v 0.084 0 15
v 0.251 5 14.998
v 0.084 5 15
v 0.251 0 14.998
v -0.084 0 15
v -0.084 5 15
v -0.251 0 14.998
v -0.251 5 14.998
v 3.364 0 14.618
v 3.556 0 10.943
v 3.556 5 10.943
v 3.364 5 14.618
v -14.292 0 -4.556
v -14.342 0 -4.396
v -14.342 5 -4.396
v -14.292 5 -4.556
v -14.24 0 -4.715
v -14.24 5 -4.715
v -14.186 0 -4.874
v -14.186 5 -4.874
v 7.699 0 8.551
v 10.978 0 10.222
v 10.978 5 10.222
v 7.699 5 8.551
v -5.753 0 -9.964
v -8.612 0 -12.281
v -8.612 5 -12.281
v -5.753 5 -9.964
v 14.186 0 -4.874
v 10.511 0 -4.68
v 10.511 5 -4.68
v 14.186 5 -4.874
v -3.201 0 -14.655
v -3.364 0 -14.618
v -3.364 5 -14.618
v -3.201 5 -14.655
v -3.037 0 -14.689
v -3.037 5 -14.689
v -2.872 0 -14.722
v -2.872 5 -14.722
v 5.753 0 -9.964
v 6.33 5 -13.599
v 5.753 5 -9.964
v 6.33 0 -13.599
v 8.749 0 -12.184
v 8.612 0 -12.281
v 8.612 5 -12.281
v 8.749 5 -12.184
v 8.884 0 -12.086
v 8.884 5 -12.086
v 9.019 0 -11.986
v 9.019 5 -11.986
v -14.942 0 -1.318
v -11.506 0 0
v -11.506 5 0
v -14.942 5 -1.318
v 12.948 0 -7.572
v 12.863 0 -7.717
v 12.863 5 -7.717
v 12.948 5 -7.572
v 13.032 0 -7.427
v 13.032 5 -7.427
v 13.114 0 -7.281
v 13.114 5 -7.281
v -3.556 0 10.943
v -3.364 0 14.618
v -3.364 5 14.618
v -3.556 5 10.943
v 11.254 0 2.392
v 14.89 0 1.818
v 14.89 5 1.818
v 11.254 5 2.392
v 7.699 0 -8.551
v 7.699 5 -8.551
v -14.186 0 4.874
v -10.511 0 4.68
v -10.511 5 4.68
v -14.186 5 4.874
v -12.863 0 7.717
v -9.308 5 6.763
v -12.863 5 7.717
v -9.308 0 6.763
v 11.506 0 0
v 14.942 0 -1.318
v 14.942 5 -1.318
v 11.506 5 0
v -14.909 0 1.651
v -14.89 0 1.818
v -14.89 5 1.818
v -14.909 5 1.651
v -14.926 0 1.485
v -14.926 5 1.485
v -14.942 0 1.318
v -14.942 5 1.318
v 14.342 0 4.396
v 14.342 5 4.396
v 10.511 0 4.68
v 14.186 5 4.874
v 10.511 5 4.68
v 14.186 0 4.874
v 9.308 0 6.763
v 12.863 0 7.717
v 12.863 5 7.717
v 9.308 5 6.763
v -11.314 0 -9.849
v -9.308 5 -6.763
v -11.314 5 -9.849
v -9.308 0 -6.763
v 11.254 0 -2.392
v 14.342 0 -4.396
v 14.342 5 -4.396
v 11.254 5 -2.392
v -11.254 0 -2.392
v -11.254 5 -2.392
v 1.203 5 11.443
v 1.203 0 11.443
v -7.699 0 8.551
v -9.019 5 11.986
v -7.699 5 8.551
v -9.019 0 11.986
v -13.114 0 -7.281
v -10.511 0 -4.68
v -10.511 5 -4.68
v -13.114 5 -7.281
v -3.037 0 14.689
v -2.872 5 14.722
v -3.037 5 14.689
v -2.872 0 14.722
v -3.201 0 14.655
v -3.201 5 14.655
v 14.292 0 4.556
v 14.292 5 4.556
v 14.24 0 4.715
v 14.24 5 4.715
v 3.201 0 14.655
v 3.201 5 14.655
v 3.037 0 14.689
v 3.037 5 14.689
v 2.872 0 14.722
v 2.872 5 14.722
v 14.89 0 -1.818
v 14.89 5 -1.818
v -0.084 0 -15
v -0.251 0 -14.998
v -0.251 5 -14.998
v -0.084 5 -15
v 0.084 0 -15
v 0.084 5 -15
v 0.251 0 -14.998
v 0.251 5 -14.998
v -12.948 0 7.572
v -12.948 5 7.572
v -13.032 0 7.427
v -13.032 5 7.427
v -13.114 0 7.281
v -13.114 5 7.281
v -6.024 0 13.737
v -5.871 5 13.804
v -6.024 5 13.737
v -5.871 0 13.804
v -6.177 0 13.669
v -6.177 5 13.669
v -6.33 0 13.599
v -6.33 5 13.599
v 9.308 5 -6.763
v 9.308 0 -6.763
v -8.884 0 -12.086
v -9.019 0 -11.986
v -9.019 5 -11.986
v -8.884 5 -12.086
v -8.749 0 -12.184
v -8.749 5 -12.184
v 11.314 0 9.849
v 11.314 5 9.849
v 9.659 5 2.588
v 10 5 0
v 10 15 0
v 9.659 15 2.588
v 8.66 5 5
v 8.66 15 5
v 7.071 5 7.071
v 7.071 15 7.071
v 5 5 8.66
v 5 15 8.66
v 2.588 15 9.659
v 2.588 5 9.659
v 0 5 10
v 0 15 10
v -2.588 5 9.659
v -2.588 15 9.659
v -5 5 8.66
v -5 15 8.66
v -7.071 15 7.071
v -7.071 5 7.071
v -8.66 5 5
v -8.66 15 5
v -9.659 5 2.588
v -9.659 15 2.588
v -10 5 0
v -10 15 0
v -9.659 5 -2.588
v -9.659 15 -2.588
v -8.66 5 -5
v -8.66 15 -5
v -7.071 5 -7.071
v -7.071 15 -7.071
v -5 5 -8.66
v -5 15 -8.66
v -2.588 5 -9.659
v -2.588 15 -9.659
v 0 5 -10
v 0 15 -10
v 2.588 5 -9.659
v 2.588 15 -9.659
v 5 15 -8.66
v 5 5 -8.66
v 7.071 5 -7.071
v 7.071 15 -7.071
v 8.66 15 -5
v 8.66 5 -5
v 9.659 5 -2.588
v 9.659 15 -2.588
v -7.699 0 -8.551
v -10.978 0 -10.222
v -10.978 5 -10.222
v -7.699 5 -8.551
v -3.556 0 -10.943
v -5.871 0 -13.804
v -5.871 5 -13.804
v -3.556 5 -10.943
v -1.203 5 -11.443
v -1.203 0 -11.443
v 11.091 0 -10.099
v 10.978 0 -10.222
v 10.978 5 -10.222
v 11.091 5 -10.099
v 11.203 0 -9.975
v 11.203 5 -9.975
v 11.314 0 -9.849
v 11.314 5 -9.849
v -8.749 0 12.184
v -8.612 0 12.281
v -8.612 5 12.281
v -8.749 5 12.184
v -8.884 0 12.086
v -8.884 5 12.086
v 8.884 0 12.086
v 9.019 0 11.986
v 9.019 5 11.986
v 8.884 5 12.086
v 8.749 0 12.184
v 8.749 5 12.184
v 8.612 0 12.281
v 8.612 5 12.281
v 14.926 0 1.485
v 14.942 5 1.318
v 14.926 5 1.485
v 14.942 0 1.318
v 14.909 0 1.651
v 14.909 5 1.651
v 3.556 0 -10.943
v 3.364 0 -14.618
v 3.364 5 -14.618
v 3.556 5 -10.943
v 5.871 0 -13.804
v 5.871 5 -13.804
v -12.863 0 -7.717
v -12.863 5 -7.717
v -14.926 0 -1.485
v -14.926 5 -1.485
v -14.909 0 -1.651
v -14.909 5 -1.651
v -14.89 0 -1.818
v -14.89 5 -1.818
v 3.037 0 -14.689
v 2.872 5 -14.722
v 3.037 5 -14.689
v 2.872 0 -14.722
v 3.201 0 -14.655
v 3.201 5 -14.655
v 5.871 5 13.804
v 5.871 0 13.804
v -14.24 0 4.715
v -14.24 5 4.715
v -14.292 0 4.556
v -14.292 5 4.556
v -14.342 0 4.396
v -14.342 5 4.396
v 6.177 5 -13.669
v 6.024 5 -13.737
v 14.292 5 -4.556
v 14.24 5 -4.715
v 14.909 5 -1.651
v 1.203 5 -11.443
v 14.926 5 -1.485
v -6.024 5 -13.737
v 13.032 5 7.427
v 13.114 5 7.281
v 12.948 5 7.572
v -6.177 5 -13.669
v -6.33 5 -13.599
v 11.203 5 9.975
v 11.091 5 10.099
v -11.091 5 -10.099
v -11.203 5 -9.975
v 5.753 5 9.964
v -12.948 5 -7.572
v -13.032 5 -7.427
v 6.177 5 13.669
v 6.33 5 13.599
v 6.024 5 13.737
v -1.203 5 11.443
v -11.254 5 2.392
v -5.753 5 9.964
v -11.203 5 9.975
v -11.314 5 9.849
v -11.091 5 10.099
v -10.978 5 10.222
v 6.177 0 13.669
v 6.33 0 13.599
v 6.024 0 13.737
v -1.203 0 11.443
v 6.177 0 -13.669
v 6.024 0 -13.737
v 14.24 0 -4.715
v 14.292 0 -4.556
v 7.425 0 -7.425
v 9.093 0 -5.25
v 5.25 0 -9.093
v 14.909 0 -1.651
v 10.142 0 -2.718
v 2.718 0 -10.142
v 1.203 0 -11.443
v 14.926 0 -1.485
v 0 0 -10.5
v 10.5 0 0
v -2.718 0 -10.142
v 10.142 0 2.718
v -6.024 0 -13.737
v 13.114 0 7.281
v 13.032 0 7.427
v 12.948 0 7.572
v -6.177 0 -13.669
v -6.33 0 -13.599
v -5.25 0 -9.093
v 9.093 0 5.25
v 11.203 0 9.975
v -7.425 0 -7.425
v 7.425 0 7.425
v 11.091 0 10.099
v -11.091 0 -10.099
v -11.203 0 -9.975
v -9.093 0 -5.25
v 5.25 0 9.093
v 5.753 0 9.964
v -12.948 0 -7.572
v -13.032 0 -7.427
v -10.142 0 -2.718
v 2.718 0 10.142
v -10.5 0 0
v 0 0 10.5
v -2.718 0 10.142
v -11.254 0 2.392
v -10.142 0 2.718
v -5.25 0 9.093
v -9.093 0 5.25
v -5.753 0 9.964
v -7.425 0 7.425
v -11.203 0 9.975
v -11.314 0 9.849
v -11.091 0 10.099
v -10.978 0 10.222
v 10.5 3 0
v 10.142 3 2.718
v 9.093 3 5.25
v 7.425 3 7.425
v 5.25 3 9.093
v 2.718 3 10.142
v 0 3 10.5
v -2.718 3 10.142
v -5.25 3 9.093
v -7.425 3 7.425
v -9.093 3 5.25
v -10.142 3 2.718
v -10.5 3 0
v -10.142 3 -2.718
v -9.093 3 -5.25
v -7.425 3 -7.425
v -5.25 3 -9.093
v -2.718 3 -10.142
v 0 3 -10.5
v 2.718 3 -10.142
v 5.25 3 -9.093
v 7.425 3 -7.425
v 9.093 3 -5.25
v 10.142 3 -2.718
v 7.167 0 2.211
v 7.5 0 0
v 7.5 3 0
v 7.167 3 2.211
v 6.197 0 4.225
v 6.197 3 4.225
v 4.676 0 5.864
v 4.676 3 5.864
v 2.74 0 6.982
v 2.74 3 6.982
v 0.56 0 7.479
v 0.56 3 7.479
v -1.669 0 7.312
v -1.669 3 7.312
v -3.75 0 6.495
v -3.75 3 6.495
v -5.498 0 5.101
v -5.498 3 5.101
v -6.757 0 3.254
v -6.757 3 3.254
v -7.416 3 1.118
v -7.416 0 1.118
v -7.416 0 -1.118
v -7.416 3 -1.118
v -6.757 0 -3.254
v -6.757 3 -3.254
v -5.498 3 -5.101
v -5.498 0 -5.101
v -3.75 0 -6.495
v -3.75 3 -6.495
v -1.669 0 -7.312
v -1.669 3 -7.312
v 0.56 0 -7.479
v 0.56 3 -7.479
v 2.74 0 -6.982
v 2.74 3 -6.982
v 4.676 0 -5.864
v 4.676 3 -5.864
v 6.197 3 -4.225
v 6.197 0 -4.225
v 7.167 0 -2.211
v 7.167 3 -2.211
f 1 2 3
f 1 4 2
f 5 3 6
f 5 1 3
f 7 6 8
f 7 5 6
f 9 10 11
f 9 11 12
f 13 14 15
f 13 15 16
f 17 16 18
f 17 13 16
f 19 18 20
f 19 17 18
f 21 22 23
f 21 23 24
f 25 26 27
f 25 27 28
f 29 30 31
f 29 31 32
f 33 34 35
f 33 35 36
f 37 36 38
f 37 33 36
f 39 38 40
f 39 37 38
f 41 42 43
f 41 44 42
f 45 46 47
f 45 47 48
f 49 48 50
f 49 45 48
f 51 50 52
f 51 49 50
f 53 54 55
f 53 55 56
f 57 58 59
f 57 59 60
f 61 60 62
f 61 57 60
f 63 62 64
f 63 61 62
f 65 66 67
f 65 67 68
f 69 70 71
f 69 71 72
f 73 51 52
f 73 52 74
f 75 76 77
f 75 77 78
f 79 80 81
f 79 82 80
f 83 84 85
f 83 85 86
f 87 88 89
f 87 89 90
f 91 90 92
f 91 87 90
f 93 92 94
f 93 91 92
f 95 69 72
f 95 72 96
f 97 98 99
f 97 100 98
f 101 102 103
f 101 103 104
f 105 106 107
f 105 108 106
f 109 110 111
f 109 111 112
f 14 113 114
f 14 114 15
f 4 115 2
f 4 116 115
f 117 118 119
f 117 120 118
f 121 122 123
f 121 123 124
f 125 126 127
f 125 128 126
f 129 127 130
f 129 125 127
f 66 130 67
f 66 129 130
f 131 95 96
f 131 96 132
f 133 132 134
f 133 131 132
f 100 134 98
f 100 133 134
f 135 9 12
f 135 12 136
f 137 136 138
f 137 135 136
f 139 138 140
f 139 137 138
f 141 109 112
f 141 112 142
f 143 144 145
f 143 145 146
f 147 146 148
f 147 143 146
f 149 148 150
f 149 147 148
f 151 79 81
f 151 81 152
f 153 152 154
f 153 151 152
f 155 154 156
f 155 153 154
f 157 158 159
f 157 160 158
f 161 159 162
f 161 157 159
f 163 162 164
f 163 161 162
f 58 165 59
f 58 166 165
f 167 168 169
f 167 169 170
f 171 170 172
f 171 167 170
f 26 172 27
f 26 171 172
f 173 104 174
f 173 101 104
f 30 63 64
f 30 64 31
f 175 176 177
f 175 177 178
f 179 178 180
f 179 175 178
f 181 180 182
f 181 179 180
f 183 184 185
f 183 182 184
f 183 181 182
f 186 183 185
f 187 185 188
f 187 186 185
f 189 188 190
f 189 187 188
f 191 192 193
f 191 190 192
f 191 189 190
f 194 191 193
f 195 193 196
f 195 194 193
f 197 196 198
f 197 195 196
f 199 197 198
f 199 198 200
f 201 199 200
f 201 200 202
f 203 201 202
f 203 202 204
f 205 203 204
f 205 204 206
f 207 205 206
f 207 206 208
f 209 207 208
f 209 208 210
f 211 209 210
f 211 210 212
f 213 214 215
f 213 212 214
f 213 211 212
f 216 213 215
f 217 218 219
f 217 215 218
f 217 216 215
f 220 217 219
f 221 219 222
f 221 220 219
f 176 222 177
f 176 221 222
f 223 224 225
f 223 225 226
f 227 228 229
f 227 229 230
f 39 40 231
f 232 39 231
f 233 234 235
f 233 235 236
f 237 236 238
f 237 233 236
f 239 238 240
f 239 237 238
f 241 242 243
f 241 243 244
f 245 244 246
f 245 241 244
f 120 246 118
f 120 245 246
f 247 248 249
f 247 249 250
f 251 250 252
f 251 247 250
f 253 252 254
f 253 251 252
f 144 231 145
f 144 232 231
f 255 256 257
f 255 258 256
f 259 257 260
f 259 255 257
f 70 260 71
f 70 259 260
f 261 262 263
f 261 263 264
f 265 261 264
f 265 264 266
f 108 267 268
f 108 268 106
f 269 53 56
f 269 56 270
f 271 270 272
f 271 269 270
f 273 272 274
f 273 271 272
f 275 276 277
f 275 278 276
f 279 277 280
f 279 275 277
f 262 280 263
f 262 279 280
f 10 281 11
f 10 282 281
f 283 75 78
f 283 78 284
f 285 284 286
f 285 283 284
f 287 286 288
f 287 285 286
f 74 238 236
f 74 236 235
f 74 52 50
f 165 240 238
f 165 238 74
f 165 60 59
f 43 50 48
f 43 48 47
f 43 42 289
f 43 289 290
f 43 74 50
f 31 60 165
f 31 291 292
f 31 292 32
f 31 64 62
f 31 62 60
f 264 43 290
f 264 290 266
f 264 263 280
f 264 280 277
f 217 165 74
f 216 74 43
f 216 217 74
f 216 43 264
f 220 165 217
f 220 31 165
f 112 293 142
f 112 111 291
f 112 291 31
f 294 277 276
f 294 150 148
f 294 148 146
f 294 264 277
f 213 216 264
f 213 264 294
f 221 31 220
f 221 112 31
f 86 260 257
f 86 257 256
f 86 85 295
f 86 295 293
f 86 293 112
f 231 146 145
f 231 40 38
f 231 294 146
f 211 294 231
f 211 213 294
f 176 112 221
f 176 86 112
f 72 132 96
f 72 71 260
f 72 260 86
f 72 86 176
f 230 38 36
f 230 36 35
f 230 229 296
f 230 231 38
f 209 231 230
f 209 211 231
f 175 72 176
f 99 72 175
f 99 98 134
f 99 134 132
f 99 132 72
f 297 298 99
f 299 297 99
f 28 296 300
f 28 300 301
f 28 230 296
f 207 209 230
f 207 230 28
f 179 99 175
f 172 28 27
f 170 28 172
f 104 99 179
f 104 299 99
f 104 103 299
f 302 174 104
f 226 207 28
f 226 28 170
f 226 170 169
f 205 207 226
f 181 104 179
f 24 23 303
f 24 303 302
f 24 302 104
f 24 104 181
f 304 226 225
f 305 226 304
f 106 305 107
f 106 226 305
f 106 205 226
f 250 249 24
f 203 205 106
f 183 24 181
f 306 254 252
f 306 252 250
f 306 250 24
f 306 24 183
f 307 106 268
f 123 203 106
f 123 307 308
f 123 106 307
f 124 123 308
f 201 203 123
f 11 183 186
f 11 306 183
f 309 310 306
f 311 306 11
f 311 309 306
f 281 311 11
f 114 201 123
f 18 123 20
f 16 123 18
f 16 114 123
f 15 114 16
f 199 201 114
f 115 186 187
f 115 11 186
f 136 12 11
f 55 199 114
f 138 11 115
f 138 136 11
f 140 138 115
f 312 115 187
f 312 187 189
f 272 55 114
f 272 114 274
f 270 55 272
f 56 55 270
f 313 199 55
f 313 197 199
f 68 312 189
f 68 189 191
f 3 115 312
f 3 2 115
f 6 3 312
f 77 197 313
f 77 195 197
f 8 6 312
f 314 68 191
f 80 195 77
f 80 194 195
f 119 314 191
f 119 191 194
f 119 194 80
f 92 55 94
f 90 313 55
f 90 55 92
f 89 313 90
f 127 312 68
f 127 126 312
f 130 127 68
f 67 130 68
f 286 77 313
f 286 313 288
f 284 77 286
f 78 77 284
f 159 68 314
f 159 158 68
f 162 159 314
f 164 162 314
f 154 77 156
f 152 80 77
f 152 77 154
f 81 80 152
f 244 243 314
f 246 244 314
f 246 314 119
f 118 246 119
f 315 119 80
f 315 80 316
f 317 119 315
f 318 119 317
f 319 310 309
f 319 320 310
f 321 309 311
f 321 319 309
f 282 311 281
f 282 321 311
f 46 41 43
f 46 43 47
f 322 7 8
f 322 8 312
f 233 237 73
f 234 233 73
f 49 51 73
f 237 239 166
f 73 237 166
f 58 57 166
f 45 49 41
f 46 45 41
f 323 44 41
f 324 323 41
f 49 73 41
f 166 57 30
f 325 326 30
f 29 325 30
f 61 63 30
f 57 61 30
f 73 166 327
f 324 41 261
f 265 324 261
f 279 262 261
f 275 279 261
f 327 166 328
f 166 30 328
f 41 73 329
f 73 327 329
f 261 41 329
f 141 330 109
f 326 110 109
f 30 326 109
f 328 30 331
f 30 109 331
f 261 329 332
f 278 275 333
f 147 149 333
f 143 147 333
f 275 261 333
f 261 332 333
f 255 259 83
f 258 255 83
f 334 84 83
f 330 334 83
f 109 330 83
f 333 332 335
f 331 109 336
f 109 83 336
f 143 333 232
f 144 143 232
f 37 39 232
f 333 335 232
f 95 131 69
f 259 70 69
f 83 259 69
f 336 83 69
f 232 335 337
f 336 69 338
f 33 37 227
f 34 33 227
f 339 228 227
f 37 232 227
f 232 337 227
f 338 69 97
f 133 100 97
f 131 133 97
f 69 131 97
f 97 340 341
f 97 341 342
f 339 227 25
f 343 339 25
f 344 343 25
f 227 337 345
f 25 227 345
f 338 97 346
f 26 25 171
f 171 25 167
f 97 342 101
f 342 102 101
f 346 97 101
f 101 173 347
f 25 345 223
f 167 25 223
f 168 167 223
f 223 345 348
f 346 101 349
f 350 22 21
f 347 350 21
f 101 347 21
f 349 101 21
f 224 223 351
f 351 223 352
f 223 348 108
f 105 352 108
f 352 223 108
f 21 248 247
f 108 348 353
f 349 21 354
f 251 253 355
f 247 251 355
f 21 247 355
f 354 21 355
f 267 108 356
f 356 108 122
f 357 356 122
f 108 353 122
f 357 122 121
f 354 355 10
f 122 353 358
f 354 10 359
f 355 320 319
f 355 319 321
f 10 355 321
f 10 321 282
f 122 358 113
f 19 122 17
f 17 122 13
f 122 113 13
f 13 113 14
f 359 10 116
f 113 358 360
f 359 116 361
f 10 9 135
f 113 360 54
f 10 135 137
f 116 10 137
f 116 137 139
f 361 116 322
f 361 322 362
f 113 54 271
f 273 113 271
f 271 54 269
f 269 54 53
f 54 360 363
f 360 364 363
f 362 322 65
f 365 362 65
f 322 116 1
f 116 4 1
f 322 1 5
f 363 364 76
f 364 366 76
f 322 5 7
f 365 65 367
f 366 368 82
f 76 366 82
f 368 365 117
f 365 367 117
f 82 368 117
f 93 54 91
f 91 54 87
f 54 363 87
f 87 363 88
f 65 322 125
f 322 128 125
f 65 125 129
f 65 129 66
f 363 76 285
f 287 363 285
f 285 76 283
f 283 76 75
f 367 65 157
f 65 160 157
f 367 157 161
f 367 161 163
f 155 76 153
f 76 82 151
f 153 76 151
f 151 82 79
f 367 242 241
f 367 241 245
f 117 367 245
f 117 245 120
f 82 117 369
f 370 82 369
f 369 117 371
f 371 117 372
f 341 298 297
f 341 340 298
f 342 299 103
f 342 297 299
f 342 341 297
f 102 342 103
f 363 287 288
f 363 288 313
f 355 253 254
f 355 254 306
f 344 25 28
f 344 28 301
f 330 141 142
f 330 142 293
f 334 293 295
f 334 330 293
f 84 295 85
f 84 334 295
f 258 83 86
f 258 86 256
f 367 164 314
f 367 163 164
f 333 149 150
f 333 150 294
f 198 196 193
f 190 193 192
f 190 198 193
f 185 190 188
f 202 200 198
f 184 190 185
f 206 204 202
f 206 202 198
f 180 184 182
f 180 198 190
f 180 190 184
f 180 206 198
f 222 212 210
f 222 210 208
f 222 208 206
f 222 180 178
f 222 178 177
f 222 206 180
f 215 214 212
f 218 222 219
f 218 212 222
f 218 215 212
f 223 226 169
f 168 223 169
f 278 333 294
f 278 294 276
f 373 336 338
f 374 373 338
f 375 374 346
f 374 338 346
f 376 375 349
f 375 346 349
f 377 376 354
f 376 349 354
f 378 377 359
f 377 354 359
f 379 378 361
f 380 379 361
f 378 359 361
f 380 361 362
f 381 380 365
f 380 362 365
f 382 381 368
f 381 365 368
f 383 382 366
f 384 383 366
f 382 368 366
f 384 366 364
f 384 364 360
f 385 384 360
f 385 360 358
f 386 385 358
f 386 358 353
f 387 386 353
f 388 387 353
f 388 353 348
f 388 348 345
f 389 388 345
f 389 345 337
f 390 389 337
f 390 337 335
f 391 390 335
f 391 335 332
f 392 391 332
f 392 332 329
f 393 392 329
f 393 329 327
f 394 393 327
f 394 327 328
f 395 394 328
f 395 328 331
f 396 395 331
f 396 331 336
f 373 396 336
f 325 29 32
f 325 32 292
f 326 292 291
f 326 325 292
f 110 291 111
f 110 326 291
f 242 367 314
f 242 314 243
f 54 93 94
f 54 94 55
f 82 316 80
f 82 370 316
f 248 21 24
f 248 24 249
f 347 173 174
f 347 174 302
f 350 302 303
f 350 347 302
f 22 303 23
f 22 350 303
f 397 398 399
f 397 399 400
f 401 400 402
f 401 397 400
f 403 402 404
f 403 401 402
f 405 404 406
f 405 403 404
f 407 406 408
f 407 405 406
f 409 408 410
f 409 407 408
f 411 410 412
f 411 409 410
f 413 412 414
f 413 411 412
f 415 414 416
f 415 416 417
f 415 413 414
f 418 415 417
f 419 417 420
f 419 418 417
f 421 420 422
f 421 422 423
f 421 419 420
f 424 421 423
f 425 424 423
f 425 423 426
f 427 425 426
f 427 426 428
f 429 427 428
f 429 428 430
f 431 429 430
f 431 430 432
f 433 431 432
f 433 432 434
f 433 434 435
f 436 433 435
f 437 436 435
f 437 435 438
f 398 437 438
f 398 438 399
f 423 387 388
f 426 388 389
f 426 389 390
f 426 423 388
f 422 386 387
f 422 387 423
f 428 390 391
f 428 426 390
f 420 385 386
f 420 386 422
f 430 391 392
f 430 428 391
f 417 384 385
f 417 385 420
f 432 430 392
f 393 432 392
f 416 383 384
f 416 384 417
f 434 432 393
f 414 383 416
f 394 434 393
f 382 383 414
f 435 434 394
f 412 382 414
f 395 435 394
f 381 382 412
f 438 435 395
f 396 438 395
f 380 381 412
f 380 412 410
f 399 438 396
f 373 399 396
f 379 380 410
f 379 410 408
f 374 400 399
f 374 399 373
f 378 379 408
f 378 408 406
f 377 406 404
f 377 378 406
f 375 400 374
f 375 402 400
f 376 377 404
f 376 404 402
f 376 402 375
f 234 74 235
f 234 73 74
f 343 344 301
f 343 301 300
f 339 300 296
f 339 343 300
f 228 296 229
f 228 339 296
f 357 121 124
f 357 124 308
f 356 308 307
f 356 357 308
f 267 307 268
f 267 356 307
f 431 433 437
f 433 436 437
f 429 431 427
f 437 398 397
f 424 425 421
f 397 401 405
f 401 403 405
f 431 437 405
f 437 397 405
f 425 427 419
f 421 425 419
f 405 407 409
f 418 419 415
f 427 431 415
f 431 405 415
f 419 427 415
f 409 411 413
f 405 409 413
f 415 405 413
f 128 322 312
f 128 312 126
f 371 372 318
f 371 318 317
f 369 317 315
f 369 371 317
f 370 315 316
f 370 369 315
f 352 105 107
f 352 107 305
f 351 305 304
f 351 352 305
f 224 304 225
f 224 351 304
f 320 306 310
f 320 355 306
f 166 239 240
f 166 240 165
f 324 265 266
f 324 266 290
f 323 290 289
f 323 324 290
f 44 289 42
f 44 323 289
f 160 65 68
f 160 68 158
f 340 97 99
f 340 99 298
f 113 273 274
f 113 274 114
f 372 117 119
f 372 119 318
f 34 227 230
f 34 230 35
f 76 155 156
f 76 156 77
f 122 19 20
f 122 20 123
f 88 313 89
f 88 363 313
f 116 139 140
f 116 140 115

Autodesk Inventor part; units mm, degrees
ref_plane "YZ Plane" through (0, 0, 0) normal (1, 0, 0) x (0, 1, 0)
ref_plane "XZ Plane" through (0, 0, 0) normal (0, 1, 0) x (-1, 0, 0)
ref_plane "XY Plane" through (0, 0, 0) normal (0, 0, 1) x (1, 0, 0)
sketch "Sketch1" plane through (0, 0, 0) normal (0, 1, 0) x (-1, 0, 0)
  circle A0 centre (0, 0) radius 15
  line L0 (14.942, 1.3178) -> (11.506, 0)
  line L1 (11.506, 0) -> (14.942, -1.3178)
  line L2 (14.3415, 4.3956) -> (11.2545, 2.3922)
  line L3 (11.2545, 2.3922) -> (14.8895, 1.8176)
  line L4 (13.1142, 7.2813) -> (10.5112, 4.6799)
  line L5 (10.5112, 4.6799) -> (14.1862, 4.8736)
  line L6 (11.3137, 9.8488) -> (9.3085, 6.763)
  line L7 (9.3085, 6.763) -> (12.8629, 7.7166)
  line L8 (9.0188, 11.9859) -> (7.699, 8.5506)
  line L9 (7.699, 8.5506) -> (10.9775, 10.2223)
  line L10 (6.3297, 13.5991) -> (5.753, 9.9645)
  line L11 (5.753, 9.9645) -> (8.6123, 12.2812)
  line L12 (3.364, 14.6179) -> (3.5555, 10.9428)
  line L13 (3.5555, 10.9428) -> (5.8706, 13.8035)
  line L14 (0.2513, 14.9979) -> (1.2027, 11.4429)
  line L15 (1.2027, 11.4429) -> (2.8725, 14.7224)
  line L16 (-2.8725, 14.7224) -> (-1.2027, 11.4429)
  line L17 (-1.2027, 11.4429) -> (-0.2513, 14.9979)
  line L18 (-5.8706, 13.8035) -> (-3.5555, 10.9428)
  line L19 (-3.5555, 10.9428) -> (-3.364, 14.6179)
  line L20 (-8.6123, 12.2812) -> (-5.753, 9.9645)
  line L21 (-5.753, 9.9645) -> (-6.3297, 13.5991)
  line L22 (-10.9775, 10.2223) -> (-7.699, 8.5506)
  line L23 (-7.699, 8.5506) -> (-9.0188, 11.9859)
  line L24 (-12.8629, 7.7166) -> (-9.3085, 6.763)
  line L25 (-9.3085, 6.763) -> (-11.3137, 9.8488)
  line L26 (-14.1862, 4.8736) -> (-10.5112, 4.6799)
  line L27 (-10.5112, 4.6799) -> (-13.1142, 7.2813)
  line L28 (-14.8895, 1.8176) -> (-11.2545, 2.3922)
  line L29 (-11.2545, 2.3922) -> (-14.3415, 4.3956)
  line L30 (-14.942, -1.3178) -> (-11.506, 0)
  line L31 (-11.506, 0) -> (-14.942, 1.3178)
  line L32 (-14.3415, -4.3956) -> (-11.2545, -2.3922)
  line L33 (-11.2545, -2.3922) -> (-14.8895, -1.8176)
  line L34 (-13.1142, -7.2813) -> (-10.5112, -4.6799)
  line L35 (-10.5112, -4.6799) -> (-14.1862, -4.8736)
  line L36 (-11.3137, -9.8488) -> (-9.3085, -6.763)
  line L37 (-9.3085, -6.763) -> (-12.8629, -7.7166)
  line L38 (-9.0188, -11.9859) -> (-7.699, -8.5506)
  line L39 (-7.699, -8.5506) -> (-10.9775, -10.2223)
  line L40 (-6.3297, -13.5991) -> (-5.753, -9.9645)
  line L41 (-5.753, -9.9645) -> (-8.6123, -12.2812)
  line L42 (-3.364, -14.6179) -> (-3.5555, -10.9428)
  line L43 (-3.5555, -10.9428) -> (-5.8706, -13.8035)
  line L44 (-0.2513, -14.9979) -> (-1.2027, -11.4429)
  line L45 (-1.2027, -11.4429) -> (-2.8725, -14.7224)
  line L46 (2.8725, -14.7224) -> (1.2027, -11.4429)
  line L47 (1.2027, -11.4429) -> (0.2513, -14.9979)
  line L48 (5.8706, -13.8035) -> (3.5555, -10.9428)
  line L49 (3.5555, -10.9428) -> (3.364, -14.6179)
  line L50 (8.6123, -12.2812) -> (5.753, -9.9645)
  line L51 (5.753, -9.9645) -> (6.3297, -13.5991)
  line L52 (10.9775, -10.2223) -> (7.699, -8.5506)
  line L53 (7.699, -8.5506) -> (9.0188, -11.9859)
  line L54 (12.8629, -7.7166) -> (9.3085, -6.763)
  line L55 (9.3085, -6.763) -> (11.3137, -9.8488)
  line L56 (14.1862, -4.8736) -> (10.5112, -4.6799)
  line L57 (10.5112, -4.6799) -> (13.1142, -7.2813)
  line L58 (14.8895, -1.8176) -> (11.2545, -2.3922)
  line L59 (11.2545, -2.3922) -> (14.3415, -4.3956)
  dimension "d0" = 30
  dimension "d3" = 360
extrude "Extrusion1" add sketch "Sketch1" along normal blind 5 contours L0 L1 A0 L58 L59 L56 L57 L54 L55 L52 L53 L50 L51 L48 L49 L46 L47 L44 L45 L42 L43 L40 L41 L38 L39 L36 L37 L34 L35 L32 L33 L30 L31 L28 L29 L26 L27 L24 L25 L22 L23 L20 L21 L18 L19 L16 L17 L14 L15 L12 L13 L10 L11 L8 L9 L6 L7 L4 L5 L2 L3
sketch "Sketch2" plane through (0, 0, 0) normal (0, -1, 0) x (1, 0, 0)
  circle A0 centre (0, 0) radius 10.5
  circle A1 centre (0, 0) radius 7.5
  dimension "d7" = 3
  dimension "d8" = 15
extrude "Extrusion2" cut sketch "Sketch2" against normal blind 3
sketch "Sketch3" plane through (0, 5, 0) normal (0, 1, 0) x (1, 0, 0)
  circle A0 centre (0, 0) radius 10
  dimension "d11" = 20
extrude "Extrusion3" add sketch "Sketch3" along normal blind 10
properties part number "PlanetaryGear"
